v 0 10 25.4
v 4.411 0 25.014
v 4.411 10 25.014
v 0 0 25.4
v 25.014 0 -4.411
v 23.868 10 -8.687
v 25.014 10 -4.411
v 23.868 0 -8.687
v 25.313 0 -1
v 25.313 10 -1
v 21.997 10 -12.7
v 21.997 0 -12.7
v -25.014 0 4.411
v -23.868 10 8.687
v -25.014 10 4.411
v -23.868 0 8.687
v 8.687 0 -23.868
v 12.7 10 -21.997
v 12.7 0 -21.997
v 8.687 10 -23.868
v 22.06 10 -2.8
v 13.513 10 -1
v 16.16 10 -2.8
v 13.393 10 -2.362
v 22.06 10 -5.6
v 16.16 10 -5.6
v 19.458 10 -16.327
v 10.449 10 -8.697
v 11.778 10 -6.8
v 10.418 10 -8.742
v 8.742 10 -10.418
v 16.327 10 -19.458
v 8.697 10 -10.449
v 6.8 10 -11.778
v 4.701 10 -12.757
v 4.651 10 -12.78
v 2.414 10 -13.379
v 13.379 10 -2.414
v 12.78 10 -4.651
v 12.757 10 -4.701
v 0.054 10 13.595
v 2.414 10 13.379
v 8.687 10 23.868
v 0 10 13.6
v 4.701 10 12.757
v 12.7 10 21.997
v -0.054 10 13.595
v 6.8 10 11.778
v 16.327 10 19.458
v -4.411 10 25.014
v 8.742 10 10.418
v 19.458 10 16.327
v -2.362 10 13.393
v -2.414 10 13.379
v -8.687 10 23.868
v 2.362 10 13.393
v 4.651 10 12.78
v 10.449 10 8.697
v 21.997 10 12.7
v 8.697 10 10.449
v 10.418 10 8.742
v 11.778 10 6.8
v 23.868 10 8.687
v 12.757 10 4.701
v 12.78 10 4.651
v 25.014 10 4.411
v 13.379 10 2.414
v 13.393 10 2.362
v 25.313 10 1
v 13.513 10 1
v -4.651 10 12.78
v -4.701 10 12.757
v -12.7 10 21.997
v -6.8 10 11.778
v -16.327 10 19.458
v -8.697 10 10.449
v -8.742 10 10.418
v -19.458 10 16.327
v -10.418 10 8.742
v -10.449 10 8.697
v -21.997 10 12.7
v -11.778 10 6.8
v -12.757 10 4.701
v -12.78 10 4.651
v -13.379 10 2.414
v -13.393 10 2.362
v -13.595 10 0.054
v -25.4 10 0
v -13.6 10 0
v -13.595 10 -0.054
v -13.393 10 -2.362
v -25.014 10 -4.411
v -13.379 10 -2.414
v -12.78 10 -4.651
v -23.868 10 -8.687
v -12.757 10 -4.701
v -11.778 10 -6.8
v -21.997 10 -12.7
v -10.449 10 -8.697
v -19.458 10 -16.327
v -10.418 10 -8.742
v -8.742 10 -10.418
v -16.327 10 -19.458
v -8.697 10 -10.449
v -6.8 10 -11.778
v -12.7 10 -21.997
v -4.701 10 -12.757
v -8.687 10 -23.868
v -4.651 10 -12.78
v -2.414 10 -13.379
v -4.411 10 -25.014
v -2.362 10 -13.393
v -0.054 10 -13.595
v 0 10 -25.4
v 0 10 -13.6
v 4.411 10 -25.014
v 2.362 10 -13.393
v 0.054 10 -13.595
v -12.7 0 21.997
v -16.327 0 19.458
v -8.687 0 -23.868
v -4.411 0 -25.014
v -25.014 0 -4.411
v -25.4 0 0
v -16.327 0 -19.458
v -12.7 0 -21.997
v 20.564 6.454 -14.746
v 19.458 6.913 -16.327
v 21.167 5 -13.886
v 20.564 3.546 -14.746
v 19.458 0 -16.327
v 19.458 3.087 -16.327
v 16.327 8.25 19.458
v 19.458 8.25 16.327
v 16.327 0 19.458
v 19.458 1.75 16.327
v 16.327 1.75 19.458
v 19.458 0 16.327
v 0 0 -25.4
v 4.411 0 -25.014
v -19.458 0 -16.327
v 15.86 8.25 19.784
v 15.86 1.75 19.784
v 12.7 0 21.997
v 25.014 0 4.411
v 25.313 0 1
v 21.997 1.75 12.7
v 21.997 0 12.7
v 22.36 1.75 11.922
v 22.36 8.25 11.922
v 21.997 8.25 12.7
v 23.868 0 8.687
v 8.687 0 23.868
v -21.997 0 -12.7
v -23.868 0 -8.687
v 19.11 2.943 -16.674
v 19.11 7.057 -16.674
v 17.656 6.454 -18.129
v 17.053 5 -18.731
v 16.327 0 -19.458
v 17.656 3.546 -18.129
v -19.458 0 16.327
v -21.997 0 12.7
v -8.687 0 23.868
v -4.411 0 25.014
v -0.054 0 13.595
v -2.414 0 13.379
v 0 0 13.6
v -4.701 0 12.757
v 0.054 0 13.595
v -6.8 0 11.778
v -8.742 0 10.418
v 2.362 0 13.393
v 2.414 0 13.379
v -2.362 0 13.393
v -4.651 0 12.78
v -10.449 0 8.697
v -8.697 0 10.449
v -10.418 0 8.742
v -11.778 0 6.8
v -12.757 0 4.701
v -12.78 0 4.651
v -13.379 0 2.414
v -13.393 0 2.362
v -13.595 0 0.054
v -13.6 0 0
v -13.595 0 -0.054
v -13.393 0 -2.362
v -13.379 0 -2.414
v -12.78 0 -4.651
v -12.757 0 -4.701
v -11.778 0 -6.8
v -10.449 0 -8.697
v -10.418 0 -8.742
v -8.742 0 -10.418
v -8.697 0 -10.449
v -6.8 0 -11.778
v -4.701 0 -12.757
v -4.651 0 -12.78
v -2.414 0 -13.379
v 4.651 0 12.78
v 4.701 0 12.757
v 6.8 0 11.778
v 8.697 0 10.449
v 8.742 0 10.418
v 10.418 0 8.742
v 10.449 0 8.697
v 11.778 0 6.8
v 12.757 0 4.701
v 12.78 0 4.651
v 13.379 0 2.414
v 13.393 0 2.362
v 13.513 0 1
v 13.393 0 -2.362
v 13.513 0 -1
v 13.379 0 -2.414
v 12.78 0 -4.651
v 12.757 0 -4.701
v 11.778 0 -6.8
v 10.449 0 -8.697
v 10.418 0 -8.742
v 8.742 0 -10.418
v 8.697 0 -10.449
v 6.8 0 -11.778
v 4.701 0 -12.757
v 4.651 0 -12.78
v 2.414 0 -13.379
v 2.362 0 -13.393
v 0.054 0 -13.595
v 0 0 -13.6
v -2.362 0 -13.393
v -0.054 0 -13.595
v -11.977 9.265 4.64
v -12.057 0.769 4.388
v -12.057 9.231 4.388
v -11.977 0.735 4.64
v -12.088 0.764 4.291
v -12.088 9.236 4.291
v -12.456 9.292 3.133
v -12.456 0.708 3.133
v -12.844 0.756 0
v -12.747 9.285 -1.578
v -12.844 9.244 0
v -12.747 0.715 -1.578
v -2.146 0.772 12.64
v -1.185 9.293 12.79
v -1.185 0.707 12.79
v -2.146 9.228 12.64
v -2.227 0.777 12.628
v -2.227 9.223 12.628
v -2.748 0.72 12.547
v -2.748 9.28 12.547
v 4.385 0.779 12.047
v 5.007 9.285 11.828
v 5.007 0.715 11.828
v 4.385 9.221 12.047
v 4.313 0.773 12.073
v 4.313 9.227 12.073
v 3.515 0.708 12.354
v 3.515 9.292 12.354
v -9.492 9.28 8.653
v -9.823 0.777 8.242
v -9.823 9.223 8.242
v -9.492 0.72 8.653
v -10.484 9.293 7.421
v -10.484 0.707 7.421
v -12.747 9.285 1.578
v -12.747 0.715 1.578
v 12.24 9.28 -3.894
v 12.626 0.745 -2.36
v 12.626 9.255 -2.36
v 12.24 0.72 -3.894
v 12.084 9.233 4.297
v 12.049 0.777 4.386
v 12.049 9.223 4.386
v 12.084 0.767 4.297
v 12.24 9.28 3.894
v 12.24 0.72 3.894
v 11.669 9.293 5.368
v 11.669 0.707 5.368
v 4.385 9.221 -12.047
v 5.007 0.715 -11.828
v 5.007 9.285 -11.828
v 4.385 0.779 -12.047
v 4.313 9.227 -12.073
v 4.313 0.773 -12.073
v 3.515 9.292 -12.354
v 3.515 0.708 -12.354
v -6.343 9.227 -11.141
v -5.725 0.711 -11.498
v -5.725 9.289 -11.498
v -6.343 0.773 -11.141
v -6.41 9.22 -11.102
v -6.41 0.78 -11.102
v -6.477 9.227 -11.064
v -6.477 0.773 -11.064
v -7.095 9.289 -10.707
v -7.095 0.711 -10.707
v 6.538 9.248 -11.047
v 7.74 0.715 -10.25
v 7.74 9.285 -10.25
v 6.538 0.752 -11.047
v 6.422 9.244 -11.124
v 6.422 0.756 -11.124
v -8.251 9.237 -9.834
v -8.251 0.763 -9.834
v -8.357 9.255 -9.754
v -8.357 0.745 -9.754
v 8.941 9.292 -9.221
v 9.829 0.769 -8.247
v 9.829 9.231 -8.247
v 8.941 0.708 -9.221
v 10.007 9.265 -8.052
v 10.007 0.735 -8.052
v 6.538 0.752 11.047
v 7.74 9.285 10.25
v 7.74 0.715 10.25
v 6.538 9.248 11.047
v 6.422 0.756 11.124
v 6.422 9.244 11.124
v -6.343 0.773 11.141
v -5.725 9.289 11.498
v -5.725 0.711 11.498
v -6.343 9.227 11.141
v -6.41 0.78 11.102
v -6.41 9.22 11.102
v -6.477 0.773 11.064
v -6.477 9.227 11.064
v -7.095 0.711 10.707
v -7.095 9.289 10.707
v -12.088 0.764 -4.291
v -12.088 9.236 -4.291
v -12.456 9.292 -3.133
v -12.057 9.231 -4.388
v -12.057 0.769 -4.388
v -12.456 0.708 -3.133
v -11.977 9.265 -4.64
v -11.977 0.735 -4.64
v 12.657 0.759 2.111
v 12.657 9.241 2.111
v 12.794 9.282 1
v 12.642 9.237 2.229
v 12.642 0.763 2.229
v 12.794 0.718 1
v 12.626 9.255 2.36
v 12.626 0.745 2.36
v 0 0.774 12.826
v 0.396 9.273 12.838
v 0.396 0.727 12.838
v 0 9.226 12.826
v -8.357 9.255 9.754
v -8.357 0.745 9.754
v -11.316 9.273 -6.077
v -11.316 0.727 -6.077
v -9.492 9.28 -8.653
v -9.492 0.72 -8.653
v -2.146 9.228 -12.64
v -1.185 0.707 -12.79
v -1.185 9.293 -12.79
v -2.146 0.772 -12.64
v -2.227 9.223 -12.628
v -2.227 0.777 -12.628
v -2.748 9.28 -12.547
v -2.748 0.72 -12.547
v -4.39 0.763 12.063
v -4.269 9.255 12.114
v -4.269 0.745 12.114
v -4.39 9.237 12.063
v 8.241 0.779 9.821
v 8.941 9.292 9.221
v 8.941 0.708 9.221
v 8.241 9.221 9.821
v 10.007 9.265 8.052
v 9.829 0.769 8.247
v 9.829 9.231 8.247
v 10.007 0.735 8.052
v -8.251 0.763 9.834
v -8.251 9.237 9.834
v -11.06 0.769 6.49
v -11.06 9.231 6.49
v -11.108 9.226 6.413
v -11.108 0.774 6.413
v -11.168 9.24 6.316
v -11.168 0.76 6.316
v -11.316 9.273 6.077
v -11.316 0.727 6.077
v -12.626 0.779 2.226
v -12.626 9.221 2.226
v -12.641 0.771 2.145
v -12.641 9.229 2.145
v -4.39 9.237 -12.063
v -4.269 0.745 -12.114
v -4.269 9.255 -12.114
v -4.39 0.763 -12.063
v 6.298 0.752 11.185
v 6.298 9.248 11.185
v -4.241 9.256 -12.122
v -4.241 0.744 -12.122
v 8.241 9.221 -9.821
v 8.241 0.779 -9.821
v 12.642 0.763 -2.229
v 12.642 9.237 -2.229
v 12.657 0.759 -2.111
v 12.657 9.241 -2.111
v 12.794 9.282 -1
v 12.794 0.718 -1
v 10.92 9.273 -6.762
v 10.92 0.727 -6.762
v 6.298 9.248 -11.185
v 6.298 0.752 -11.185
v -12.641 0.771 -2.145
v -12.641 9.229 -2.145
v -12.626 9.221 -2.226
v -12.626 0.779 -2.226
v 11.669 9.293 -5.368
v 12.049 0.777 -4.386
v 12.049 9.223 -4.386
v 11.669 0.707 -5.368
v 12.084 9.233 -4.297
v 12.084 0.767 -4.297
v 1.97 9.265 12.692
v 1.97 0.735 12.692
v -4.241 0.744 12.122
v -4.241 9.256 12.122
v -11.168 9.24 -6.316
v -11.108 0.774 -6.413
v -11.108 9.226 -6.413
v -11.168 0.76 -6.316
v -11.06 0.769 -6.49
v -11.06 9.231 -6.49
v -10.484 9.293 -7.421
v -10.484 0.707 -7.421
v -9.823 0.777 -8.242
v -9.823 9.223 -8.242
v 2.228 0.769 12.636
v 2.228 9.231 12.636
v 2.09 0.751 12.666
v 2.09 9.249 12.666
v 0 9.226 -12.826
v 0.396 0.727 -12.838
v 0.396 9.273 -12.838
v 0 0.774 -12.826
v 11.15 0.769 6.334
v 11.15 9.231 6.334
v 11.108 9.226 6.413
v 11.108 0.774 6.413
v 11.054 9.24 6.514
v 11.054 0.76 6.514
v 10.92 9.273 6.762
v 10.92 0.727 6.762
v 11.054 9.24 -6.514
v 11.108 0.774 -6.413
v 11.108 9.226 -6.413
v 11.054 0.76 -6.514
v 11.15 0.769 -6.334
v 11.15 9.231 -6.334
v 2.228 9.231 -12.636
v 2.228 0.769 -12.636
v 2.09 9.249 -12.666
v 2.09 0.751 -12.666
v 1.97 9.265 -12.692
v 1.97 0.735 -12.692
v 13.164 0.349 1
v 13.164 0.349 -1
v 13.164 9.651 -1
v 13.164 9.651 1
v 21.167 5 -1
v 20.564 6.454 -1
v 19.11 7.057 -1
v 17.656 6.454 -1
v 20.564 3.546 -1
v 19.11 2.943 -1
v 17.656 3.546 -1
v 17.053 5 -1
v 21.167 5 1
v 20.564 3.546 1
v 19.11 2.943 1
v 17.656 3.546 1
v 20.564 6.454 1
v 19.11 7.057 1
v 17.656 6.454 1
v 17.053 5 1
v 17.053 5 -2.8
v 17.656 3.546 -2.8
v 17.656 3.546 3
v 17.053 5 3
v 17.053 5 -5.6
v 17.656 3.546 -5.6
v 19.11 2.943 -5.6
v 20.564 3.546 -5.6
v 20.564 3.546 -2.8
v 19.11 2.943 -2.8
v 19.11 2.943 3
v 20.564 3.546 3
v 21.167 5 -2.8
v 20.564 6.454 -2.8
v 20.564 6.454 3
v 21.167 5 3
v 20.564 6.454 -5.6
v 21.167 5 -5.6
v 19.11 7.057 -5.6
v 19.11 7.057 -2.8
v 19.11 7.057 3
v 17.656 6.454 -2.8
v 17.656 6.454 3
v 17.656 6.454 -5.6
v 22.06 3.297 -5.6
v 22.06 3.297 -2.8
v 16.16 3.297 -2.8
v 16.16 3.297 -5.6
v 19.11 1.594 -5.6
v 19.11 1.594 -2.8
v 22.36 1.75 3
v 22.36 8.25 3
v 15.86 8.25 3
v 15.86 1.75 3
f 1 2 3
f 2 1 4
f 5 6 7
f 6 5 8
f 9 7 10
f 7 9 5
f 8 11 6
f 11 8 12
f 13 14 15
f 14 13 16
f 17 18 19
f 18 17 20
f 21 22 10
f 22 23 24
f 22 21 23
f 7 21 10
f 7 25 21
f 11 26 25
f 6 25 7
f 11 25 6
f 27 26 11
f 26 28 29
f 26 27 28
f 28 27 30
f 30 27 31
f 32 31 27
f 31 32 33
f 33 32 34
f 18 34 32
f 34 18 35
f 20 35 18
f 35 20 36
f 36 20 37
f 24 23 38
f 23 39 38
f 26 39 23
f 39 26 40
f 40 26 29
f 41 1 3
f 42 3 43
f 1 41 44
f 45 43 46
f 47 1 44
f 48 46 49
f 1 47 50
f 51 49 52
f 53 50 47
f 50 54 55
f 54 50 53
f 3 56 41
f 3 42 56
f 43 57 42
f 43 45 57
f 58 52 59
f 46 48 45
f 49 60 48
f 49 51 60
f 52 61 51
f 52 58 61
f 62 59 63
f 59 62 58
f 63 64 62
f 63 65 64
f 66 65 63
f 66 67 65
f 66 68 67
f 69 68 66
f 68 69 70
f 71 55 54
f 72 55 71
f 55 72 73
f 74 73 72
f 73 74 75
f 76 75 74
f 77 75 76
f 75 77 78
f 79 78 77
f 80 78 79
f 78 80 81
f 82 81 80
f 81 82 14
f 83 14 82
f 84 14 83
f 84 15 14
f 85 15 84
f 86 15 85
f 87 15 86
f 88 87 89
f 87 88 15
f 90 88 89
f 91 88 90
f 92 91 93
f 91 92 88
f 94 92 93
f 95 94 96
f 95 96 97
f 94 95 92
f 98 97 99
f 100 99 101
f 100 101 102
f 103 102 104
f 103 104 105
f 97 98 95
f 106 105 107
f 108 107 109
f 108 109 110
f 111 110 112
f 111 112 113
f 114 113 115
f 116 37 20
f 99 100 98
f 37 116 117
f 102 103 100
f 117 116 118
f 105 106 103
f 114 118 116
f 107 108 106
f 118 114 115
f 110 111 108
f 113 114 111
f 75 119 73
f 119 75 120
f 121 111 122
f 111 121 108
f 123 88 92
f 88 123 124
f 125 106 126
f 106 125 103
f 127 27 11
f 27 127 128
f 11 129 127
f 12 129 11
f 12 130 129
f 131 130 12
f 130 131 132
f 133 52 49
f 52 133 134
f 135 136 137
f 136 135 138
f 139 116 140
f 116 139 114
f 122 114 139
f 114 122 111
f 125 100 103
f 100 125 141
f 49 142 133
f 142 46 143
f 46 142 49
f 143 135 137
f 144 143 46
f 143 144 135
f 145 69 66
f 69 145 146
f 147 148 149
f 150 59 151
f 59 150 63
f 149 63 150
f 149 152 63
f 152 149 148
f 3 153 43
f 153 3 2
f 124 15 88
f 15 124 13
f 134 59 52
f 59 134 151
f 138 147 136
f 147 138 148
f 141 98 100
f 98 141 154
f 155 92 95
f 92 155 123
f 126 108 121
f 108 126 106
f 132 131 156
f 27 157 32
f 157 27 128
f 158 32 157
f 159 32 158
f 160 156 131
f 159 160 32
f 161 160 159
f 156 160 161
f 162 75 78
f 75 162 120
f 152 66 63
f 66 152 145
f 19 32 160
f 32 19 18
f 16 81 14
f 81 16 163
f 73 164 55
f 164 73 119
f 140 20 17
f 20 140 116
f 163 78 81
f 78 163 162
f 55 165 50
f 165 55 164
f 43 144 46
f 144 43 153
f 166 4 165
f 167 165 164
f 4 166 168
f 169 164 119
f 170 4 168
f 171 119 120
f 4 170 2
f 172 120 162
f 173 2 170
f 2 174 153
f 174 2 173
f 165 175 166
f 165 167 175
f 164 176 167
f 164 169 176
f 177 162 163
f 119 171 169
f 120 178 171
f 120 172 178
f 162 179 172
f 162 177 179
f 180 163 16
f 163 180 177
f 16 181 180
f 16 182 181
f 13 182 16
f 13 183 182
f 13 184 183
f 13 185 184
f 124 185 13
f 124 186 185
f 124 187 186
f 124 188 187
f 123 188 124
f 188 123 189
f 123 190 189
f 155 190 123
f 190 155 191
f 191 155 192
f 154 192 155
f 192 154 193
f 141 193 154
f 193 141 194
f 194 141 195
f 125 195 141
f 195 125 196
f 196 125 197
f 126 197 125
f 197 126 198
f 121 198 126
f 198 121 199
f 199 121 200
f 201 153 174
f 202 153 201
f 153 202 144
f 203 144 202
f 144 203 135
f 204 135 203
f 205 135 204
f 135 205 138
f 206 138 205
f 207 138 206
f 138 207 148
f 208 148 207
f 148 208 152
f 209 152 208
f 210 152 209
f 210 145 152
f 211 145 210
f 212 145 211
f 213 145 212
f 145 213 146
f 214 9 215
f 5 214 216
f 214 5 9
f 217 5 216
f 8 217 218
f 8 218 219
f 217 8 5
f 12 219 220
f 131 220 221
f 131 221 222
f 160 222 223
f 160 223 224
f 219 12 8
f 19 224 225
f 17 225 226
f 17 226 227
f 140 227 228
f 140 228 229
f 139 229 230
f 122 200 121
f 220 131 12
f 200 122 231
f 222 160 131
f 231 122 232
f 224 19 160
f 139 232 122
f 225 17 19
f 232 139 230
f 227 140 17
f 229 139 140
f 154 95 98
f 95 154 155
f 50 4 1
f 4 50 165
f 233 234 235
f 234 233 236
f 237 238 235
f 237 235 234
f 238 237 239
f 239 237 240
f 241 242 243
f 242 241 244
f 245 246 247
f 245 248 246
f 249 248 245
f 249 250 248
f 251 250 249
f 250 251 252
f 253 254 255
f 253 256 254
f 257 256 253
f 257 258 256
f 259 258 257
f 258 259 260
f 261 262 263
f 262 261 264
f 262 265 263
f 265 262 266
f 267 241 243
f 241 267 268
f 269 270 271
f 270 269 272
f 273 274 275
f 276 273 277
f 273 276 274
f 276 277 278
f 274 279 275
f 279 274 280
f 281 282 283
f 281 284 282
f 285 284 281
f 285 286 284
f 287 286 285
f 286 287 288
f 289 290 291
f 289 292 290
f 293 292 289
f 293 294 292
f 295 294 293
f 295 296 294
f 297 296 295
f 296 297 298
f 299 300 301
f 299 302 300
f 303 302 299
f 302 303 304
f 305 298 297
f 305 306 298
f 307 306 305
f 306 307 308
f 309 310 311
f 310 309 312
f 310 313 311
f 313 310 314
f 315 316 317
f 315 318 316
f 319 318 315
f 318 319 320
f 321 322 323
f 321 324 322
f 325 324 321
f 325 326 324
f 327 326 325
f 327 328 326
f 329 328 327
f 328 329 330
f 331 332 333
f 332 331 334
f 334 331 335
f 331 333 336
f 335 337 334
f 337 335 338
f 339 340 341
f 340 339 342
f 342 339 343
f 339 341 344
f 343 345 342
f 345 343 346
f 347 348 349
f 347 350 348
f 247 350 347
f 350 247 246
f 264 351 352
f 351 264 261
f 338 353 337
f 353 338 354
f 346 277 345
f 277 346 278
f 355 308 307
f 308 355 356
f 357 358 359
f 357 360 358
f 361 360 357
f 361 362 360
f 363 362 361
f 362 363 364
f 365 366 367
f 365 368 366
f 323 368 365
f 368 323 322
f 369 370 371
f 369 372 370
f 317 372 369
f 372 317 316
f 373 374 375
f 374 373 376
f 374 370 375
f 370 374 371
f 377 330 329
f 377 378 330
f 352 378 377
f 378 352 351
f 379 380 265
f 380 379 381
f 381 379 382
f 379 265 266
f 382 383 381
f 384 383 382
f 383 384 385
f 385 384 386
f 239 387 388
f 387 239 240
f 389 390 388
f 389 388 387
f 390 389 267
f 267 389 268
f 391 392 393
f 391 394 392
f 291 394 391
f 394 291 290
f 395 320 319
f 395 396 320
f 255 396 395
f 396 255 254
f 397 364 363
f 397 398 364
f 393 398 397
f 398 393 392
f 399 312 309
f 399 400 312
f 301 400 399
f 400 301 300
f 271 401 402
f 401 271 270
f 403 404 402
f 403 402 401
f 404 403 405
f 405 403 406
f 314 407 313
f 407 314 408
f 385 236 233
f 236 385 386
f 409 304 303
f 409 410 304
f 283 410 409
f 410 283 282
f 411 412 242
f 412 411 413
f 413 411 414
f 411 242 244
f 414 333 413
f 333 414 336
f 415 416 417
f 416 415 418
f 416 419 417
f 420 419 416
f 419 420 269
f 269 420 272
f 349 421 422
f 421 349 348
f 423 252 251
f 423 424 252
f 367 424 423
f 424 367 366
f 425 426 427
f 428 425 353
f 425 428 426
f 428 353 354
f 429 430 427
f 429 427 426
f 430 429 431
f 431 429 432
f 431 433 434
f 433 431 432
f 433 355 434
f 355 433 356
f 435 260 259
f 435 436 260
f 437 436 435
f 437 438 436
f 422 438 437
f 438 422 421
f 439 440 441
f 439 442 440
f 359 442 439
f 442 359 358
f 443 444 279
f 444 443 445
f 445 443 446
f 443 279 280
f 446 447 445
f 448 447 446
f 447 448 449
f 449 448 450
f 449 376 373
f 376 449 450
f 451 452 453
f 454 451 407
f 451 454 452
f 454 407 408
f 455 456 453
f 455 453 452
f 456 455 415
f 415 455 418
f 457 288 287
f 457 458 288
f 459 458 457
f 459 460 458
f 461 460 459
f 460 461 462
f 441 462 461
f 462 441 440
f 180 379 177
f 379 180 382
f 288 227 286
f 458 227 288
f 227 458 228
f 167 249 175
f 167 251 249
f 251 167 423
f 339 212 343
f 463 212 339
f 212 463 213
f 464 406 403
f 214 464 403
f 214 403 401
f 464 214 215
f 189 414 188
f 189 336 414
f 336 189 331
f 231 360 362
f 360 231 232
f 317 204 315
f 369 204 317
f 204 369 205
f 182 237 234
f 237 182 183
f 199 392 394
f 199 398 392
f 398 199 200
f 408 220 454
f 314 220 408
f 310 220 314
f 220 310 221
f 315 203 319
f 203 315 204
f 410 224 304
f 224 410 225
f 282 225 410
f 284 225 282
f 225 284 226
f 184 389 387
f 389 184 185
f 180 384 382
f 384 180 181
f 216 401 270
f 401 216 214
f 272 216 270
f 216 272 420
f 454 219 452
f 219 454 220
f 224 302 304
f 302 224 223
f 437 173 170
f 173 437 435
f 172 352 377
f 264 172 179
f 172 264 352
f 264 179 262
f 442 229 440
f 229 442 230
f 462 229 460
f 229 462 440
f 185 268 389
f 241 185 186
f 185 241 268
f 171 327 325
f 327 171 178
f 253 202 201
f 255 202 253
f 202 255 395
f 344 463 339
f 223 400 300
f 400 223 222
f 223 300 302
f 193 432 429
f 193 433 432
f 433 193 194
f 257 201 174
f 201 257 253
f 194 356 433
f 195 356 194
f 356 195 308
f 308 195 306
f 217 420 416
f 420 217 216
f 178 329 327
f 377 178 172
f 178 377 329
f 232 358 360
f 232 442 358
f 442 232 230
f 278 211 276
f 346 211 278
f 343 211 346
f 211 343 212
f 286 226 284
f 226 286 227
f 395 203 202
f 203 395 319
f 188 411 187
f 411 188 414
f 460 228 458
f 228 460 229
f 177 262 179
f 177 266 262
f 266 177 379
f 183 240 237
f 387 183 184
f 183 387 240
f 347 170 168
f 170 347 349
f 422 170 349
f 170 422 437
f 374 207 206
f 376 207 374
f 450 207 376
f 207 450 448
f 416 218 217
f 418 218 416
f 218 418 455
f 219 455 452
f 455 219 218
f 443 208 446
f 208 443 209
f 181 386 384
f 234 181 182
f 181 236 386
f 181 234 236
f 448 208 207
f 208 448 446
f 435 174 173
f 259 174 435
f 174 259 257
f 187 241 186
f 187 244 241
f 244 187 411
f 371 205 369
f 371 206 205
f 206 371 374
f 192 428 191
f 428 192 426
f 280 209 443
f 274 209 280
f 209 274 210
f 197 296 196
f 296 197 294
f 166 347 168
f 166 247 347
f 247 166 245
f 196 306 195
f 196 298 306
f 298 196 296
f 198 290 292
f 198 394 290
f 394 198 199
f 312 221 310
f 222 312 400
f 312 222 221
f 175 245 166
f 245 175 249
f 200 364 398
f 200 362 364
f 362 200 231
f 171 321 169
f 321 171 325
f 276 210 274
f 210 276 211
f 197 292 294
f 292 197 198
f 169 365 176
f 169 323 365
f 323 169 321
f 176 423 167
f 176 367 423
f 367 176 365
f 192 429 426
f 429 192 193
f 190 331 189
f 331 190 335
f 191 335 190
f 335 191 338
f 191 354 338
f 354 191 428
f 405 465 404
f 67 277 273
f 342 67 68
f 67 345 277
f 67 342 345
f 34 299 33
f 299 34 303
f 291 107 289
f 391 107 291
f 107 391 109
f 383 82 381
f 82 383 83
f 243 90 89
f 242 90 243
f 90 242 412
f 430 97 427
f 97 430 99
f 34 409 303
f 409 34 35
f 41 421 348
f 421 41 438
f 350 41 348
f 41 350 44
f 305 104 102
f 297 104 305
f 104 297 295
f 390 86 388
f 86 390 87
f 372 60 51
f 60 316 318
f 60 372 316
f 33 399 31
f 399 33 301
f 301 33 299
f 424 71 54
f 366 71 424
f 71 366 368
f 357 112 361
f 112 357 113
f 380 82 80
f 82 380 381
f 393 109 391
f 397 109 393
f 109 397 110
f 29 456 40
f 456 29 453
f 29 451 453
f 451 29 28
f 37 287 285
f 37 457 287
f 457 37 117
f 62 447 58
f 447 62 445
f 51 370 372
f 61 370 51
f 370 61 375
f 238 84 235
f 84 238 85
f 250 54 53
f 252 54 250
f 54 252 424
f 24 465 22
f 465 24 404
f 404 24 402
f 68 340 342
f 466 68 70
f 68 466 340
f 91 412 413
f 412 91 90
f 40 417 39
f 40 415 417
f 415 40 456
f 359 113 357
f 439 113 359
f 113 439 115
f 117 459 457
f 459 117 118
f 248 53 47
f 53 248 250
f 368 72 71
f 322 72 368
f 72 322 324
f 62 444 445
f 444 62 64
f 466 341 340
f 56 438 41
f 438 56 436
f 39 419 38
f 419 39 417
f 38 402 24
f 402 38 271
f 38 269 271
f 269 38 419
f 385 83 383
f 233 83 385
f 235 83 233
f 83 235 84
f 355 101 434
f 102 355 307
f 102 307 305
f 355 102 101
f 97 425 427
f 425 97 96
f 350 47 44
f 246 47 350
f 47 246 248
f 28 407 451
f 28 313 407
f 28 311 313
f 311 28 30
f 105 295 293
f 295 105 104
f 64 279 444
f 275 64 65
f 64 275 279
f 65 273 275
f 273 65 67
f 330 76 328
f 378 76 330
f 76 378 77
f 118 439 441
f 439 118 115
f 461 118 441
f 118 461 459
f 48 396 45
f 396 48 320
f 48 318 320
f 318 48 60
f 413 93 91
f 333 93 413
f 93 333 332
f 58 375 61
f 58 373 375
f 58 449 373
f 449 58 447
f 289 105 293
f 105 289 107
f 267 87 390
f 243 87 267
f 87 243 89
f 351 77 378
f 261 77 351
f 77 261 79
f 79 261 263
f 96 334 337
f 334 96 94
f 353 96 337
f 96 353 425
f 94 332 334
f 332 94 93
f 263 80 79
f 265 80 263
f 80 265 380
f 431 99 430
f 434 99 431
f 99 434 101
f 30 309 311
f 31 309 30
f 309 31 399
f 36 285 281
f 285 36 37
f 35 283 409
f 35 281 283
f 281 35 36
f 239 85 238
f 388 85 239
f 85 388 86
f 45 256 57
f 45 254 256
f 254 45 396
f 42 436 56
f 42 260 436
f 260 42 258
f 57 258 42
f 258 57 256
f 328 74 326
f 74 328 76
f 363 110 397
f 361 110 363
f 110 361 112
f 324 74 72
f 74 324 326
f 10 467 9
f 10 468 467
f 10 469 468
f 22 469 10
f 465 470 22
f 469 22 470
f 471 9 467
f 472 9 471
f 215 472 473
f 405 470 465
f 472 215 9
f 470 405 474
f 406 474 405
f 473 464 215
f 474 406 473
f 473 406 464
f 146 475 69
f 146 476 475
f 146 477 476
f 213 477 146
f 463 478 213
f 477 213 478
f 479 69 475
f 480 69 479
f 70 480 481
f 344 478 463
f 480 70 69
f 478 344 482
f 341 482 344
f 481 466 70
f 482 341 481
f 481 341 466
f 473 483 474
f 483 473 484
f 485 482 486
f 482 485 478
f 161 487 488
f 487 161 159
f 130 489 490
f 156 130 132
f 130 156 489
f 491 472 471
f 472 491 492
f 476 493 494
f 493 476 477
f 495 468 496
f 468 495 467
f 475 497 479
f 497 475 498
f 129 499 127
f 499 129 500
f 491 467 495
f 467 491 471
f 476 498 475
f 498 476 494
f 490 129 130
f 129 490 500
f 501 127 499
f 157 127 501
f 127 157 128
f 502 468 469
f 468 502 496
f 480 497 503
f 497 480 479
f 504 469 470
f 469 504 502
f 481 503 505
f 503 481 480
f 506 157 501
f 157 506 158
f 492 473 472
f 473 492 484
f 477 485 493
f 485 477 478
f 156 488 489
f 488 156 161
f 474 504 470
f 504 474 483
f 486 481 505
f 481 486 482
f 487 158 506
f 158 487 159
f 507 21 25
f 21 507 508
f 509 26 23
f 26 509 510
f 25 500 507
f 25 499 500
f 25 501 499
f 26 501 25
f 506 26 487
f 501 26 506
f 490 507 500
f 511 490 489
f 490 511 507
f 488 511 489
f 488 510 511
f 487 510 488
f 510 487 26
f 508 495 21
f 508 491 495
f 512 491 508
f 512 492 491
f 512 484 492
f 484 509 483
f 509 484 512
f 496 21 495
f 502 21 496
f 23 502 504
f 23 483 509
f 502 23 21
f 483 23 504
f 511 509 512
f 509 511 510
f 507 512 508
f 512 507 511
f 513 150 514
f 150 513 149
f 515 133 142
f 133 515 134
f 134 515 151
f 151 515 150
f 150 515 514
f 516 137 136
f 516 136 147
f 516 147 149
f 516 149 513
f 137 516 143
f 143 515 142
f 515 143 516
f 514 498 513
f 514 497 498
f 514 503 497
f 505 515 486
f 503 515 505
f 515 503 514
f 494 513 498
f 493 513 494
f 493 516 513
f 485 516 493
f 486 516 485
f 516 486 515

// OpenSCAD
/*
    This program is free software: you can redistribute it and/or modify
    it under the terms of the GNU General Public License as published by
    the Free Software Foundation, either version 3 of the License, or
    (at your option) any later version.

    This program is distributed in the hope that it will be useful,
    but WITHOUT ANY WARRANTY; without even the implied warranty of
    MERCHANTABILITY or FITNESS FOR A PARTICULAR PURPOSE.  See the
    GNU General Public License for more details.

    You should have received a copy of the GNU General Public License
    along with this program.  If not, see <http://www.gnu.org/licenses/>.
*/

include <MCAD/materials.scad>

// shaft_collar_2
// http://www.thingiverse.com/thing:624122
// Printbus October 2016
// Originally remixed from thing http://www.thingiverse.com/thing:2454 by timschmidt
//   Parameter tol improves final fit of the holes for the shaft, clamping screw, and the trapped nut. 
//   Parameter nut_p specifies the amount of material to be placed in front of the trapped nut.
//   Parameter facets specifies the number of facets to be used.
// Revision A incorporates various design refinements
//   Bottom of nut trap now shaped to match nut, not square
//   Added chamfer to shaft bore hole edges
//   Added reference table for hardware dimensions
//   Fit tolerance can now be adjusted on each dimension
//   Migrated to MCAD library polyhole function for improved shaft and screw hole sizing
//   Constants are now labeled parameters and other parameter labels revised to improve understandability
//   Added openSCAD console echo output of key calculations
// Parameter labels typlically have a structure of (item)_(feature) e.g. hole_od
// The design was prepared with openSCAD version 2015.03
// Slicing suggestions
//   No more than two solid layers on bottom and top in order to retain flexibility in clamp
//   Limit infill to 25% or so in order to retain flexibility in clamp 
//   Some support may be desired in cutout area for screw head 

////////// REVISION HISTORY ///////////////////////////////////////////////////
// YYMMDD date code
// 150114 - initial publish
// 161031 - revA
//

////////// INCLUDE AND USE  ///////////////////////////////////////////////////
// NOTE: openSCAD version 2014.03 or newer required for MCAD library

// EXTERNAL FUNCTIONS USED
//  Requires MCAD library to be installed (openSCAD 2014.03 or later)
//  MCAD/nuts_and_bolts.scad not used so dimensioning and fit clearance can be controlled here
use <MCAD/polyholes.scad>
//  polyhole(h,d) provides improved size control on small holes

//////////////// PARAMETERS  ///////////////////////////////////////////////////
// Collar dimensioning 
collar_od = 50.8; // collar outer diameter (20mm + shaft diameter works well for M3 clamp screw)
collar_w = 10;  // collar width on the shaft (10mm works well for M3 clamp hardware)
gap = 2;        // size of the opening left for tightening
shaft_hid = 25.4 + 0.24;  // shaft bore hole inner diameter (8mm or 5/16-inch shaft nominal)
facets = 36;    // number of facets to be used for exposed edges of collar
chamfer = 0.8;  // size of chamfer lips on shaft bore hole

// Fastener and hardware component hole sizing
/*==================================================== 
Standard hardware dimension reference data
These are a reference point only; adjustment may be necessary due to nozzle size, etc.
Also note that MCAD polyhole does better at actual diameters than circle/cylinder

SIZE         THREAD  CLEAR   NUT AFD  NUT OD   NUT     HEAD     HEAD    WASHER  FLAT    
             HOLE    HOLE    WRENCH   @fn=6    HEIGHT  OD       HEIGHT  HEIGHT  OD      
-----------  ------  ------  -------  -------  ------  ------   ------  ------  ----- 
M2 x 0.4     1.75mm  2.20mm  4.0mm    4.62mm   1.6mm   4.0mm    2.0mm   0.3mm   5.5mm
M2.5 x 0.45  2.20mm  2.75mm  5.0mm    5.77mm   2.0mm   5.0mm    2.5mm   0.3mm   6.0mm
M3 x 0.5     2.70mm  3.30mm  5.5mm    6.35mm   2.4mm   6.0mm    3.0mm   0.5mm   7.0mm 
M4 x 0.7     3.50mm  4.40mm  7.0mm    8.08mm   3.2mm   8.0mm    4.0mm   0.8mm   9.0mm
M5 x 0.8     4.50mm  5.50mm  8.0mm    9.24mm   4.7mm   10.0mm   5.0mm   1.0mm   10.0mm
M6 x 1.0     5.50mm  6.60mm  10.0mm   11.55mm  5.2mm   12.0mm   6.0mm   1.6mm   12.0mm
M8 x 1.25    7.20mm  8.80mm  13.0mm   15.01mm  6.8mm   16.0mm   8.0mm   2.0mm   17.0mm
#2-56        1.85mm  2.44mm  4.76mm   5.50mm   1.59mm  4.60mm   2.18mm  0.91mm  6.35mm
#3-56        2.26mm  2.79mm  4.76mm   5.50mm   1.59mm  5.28mm   2.51mm  0.91mm  7.94mm
#4-40        2.44mm  3.26mm  6.35mm   7.33mm   2.38mm  5.97mm   2.85mm  1.14mm  9.53mm
#6-32        2.95mm  3.80mm  7.94mm   9.17mm   2.78mm  7.37mm   3.51mm  1.14mm  11.11mm
#8-32        3.66mm  4.50mm  8.73mm   10.08mm  3.18mm  8.74mm   4.17mm  1.14mm  12.7mm
#10-24       4.09mm  5.11mm  9.53mm   11.00mm  3.18mm  10.13mm  4.83mm  1.14mm  14.29mm
#10-32       4.31mm  5.11mm  9.53mm   11.00mm  3.18mm  10.13mm  4.83mm  1.14mm  14.29mm
1/4-20       5.56MM  6.76MM  11.11mm  12.83mm  4.76mm  13.03mm  6.35mm  1.80mm  18.65
Notes:       1,2     2,3     4        5        6       7,8      8,9     8,10    8,11
----------------------------------------------------------------------------------------
Note  1: Thread hole is for tap or self thread of machine screw in soft material
Note  2: Hole dimensions are from littlemachineshop.com Tap Drill - 50% Thread column data
Note  3: Clearance hole data is littlemachineshop.com Clearance Drill - Standard Fit column data
Note  4: Nut Across Flat Diameter (AFD) metric data is ISO, inch is boltdepot.com US Nut Size table
Note  5: Nut round OD is the openSCAD circle diameter required to achieve a nut size at $fn=6 
         Nut OD is calculated as = (NUT AFD)/cos(30)
Note  6: Nut height is for standard hex nut; jam nuts are less, lock nuts are more
         Metric data is ISO 4032, SAE data from boltdepot.com US Nut Size tables
Note  7: Head diameter varies with the head style; value shown is max across all except truss head
Note  8: Data from http://www.numberfactory.com/nf_metric.html or http://www.numberfactory.com/nf_inch.html 
Note  9: Head height varies with head style; value shown is max across all styles
Note 10: Standard washer height or thickness
Note 11: Flat washer outer diameter
****************************************************************************************/
// Tailor fastener sizing and fit adjustments here
// All screw holes are implemented with MCAD polyhole - more accurate than hole by cylinder
// Dimensions shown were determined with Simplify3D as slicer, inside perimeters printed first
// tolerance added to nominal corrects for extrusion width and other printer variations
screw_hid = 3.3 + 0.5;  // clamping screw clearance Hole Inner Diameter (3.3 nominal for M3 bolt; want loose fit)
head_hid = 6.0 + 0.5;   // clamping screw head clearance Hole Inner Diameter (6.0 nominal for M3 bolt)
head_pt = 2;            // head Plate Thickness - thickness of the material left behind the head of clamping screw
nut_afd = 5.5 + 0.4;    // nut across-flats diameter (5.5 nominal for M3 nut)
nut_h = 2.4 + 0.4;      // nut Height (2.4 nominal for M3 nut)
nut_pt = 1.8;           // nut Plate Thickness - amount of materal left in front of the nut

////////// NON-USER PARAMETERS AND CALCULATIONS /////////////////////////////////
// Parameters beyond this point are design constants normally not altered in basic tailoring

// Geometry mesh factors 
MF = 0.02;       // Mesh Factor is the amount of overlap on geometries for proper mesh
MSA = MF;        // Mesh Single Adjustment factor (translate ends; size adjustment on single ended mesh)
MDA = 2*MF;      // Mesh Double Adjustment (size adjustment on double ended mesh like boring holes)

// calculated parameters 
shaft_r = shaft_hid/2;                         // shaft Radius
collar_r = collar_od/2;                        // collar Radius
head_wt = (collar_w - head_hid)/2;             // Wall Thickness on each side of cutout for screw head
nut_wt = ((collar_r - shaft_r ) - nut_afd )/2; // Wall Thickness on sides of nut trap
screw_len = head_pt + gap + nut_pt + nut_h;    // suggested minimum screw length
screw_ox = shaft_r + (collar_r - shaft_r)/2;   // Offset in X axis to center of screw clearance hole

//////////////////////////////////////////////////////////////////////////////////////
// Top level geometry
shaft_collar();


module shaft_collar() {
  // Report key calculations to console
  echo(str("Screw head wall: ", head_wt,"mm each side of screw")); // material left on each side of cutout for screw head 
  echo(str("Nut wall: ", nut_wt,"mm each side of nut"));           // material left on sides of nut trap 
  echo(str("Screw length: Use ", screw_len,"mm or longer"));       // screw length recommendation

  rotate([-90,0,0])
  color(Steel)
  // shaft collar is formed by removing various elements from a solid cylinder
  difference() {
    // start with solid cylindrical body
    cylinder ( d=collar_od, h=collar_w, center=false, $fn=facets);

    // bore hole for shaft
    translate ([0, 0, -MSA]) {                     // offset Z for oversized cylinder being removed
      polyhole( h=collar_w + MDA, d=shaft_hid );   // oversize h to ensure complete removal
    } // end bore shaft hole

    // chamfer the edges of the shaft bore hole
    translate ([0, 0, -MSA]) {                     // chamfer on print-bed side
      cylinder(d1=shaft_hid + 2*chamfer, d2=shaft_hid-MDA, h=chamfer + MSA, $fn=facets);	
    }
    translate ([0, 0, collar_w - chamfer]) {       // chamfer on top side          
      cylinder(d1=shaft_hid-MDA, d2=shaft_hid + 2*chamfer, , h=chamfer + MSA, $fn=facets);	
    }

    // remove split for clamp
    translate ([ 0, -gap/2, -MSA ]) {              // offset Z for oversized cube being removed
      cube ([ collar_r + MSA, gap, collar_w + MDA ], center=false); // oversize X & Z to ensure complete removal
    } // end clamp split

    // bore clearance hole for clamp screw
    // for simplicity, just bore a hole same length as collar diameter
    translate ( [screw_ox, collar_r, collar_w/2]) { // offset Y for 1/2 the bore hole length
      rotate ( [90, 0, 0])
        polyhole ( h=collar_od, d=screw_hid );
    } // end clamp screw clearance hole

    // form the nut trap
    // first remove slot for nut insertion in upper half of collar
    translate ( [screw_ox - nut_afd/2, gap/2 + nut_pt, collar_w/2 ]){
      cube ( [nut_afd, nut_h, collar_w/2 + MSA], center=false );
    } // end insertion slot
    // remove the shaped hole for the bottom half of the nut
    translate ( [screw_ox, gap/2 + nut_pt, collar_w/2 ]) {
      rotate([270,30,0])           // rotate Y for correct orientation of the hexagon hole
        cylinder ( d=nut_afd/cos(30), h=nut_h, center=false, $fn=6); // want hexagon hole to match nut
    } // end shaped hole for nut 
    
    // remove block for screw head area 
    // for simplicity, start the block at outer edge of collar 
    translate ([screw_ox - head_hid/2, -collar_r , collar_w/2 - head_hid/2]) {
      // size cube in Y axis to inside of plate material left under head
      cube ([ head_hid, collar_r - head_pt - gap/2, head_hid ], center=false);
    } // end clearance for screw head
    
  }  // end difference
}  // end module shaft_collar
